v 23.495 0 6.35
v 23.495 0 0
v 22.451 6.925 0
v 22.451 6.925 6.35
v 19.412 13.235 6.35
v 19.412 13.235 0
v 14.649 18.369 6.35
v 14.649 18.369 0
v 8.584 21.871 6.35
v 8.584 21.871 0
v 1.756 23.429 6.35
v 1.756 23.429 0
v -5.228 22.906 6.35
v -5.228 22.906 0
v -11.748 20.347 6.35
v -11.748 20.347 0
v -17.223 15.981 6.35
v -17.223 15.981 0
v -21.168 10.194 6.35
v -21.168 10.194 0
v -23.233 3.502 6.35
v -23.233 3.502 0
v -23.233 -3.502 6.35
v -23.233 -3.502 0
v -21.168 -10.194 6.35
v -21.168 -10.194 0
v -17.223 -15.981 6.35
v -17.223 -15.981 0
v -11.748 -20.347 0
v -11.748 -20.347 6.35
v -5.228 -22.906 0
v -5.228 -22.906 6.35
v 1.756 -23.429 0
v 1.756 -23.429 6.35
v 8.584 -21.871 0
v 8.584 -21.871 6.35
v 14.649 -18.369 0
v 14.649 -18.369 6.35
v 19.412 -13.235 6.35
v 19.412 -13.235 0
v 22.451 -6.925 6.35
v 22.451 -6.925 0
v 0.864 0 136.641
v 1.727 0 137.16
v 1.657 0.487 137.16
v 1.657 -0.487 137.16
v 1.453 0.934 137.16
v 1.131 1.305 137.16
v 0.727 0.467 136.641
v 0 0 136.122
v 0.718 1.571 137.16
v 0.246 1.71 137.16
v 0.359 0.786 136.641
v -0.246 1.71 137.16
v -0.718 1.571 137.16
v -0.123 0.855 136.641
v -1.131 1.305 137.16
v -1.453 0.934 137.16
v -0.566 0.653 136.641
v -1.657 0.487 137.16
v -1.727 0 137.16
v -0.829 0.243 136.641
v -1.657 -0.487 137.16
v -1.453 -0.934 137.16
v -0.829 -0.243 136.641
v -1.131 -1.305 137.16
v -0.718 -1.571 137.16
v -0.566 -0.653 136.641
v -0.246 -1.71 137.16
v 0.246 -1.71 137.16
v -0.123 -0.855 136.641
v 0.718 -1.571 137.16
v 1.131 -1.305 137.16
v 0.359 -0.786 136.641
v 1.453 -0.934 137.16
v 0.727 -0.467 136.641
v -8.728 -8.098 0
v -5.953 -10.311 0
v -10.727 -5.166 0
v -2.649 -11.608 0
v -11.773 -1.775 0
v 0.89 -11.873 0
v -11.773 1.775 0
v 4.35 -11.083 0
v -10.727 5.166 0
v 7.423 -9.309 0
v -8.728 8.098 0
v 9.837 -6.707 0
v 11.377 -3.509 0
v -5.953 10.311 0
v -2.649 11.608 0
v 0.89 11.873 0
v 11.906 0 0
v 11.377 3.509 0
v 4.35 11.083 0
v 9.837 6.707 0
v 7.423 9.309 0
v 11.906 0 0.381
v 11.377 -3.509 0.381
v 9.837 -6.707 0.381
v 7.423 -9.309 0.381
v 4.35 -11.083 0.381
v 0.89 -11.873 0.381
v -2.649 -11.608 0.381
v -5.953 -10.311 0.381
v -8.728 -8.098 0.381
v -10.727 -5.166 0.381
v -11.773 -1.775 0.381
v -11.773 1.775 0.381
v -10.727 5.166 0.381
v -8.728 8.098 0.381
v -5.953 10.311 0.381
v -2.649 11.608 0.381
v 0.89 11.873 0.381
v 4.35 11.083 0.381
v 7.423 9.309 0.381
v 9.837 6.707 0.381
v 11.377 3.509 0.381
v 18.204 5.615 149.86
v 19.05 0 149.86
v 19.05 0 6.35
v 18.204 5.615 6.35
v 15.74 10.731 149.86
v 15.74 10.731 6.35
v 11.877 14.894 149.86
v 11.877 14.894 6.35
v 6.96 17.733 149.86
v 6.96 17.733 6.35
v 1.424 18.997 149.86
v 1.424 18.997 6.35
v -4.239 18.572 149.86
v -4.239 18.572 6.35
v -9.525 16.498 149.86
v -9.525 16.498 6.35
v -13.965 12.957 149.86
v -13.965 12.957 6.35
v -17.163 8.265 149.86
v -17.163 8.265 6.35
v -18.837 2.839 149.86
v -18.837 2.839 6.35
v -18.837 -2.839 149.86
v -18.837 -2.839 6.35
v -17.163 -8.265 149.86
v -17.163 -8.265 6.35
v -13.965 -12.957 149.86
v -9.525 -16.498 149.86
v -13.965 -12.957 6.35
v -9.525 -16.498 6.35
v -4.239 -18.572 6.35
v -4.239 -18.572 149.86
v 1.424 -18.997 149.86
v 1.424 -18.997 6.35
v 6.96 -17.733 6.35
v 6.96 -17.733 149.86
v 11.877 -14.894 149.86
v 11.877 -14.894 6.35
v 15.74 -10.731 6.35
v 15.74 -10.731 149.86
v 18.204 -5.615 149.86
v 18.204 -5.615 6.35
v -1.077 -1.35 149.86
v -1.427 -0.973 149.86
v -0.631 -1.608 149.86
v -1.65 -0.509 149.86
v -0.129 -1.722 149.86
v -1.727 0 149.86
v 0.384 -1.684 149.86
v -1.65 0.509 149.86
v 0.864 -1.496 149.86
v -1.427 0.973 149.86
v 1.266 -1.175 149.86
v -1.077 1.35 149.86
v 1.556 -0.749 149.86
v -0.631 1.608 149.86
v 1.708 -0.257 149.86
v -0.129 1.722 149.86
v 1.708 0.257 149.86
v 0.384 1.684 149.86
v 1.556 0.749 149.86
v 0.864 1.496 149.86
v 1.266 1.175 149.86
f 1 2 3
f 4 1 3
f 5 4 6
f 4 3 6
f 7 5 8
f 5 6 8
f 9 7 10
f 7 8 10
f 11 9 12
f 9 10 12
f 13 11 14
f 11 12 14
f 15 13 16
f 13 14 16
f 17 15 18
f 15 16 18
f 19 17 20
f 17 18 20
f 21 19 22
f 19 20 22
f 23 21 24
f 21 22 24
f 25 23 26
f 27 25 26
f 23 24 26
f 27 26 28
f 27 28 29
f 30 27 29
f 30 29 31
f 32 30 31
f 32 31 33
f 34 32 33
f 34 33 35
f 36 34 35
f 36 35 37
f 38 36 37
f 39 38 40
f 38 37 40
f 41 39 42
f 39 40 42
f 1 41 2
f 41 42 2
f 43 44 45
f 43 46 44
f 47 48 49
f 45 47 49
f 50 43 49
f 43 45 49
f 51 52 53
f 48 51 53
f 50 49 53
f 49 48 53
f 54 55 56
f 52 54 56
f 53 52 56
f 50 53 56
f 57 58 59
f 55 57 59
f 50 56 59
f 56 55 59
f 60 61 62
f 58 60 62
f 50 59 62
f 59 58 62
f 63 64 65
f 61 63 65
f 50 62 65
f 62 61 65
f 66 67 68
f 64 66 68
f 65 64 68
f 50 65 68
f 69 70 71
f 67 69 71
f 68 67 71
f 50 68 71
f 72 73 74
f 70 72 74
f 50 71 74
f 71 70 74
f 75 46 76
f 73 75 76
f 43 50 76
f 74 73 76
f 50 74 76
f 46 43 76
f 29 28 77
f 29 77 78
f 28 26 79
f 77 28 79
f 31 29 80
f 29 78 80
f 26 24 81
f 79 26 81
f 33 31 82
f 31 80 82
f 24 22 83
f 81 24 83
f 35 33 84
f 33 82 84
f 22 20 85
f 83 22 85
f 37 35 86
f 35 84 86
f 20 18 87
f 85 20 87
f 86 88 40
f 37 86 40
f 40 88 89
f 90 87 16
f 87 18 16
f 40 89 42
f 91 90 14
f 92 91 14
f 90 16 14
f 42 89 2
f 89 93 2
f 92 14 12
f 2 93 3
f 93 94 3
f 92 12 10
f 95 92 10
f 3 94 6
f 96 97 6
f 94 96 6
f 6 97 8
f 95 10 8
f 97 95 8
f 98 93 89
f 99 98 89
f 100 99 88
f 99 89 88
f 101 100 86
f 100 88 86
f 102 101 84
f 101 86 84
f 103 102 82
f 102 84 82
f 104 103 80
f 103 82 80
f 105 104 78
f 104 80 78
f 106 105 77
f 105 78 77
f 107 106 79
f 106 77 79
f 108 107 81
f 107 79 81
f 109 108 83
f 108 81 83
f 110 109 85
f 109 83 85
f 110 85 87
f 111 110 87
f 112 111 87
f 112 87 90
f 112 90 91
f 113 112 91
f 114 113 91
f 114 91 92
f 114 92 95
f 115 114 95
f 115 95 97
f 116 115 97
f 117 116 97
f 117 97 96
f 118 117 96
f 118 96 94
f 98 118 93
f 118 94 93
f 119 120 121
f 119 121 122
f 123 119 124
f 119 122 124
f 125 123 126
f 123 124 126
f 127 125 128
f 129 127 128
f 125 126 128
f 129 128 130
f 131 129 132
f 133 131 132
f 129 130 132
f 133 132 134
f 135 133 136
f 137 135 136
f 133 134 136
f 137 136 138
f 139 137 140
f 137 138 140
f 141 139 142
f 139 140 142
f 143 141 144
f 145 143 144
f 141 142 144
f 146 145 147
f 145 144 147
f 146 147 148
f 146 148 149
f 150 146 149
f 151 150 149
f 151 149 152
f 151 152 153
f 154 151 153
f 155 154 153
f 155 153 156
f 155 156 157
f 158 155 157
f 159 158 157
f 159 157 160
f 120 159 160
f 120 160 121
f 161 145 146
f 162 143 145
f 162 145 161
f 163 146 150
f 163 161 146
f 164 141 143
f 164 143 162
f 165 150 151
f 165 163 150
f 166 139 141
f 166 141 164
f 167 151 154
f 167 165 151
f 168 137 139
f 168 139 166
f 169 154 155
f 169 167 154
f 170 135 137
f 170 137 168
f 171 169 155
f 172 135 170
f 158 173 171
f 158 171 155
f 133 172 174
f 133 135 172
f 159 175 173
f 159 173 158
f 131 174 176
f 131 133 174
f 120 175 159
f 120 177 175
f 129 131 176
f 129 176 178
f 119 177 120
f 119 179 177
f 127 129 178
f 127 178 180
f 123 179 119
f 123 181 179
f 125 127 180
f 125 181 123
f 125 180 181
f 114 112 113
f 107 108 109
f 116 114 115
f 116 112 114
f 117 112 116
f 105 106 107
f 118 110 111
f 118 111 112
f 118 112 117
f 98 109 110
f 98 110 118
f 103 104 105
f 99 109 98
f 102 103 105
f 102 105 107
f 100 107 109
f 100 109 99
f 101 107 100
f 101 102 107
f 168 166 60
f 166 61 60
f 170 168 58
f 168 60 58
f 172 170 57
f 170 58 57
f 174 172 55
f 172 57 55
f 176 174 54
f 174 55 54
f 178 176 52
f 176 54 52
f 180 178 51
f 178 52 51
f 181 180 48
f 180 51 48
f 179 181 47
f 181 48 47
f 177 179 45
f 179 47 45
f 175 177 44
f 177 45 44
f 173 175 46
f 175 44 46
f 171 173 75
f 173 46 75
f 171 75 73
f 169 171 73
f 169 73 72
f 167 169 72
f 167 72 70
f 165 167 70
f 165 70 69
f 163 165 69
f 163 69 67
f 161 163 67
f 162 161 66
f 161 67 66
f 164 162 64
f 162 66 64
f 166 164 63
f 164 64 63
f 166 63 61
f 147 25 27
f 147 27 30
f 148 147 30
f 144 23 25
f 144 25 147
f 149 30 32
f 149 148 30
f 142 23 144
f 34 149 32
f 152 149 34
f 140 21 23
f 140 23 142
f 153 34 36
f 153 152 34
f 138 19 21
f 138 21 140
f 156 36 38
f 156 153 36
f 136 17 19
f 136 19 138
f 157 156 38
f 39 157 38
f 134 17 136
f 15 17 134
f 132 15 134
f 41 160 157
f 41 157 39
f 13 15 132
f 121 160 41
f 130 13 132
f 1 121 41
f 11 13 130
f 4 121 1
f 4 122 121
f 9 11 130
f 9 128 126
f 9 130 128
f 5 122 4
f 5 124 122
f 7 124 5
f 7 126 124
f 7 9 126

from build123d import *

# Parameters (mm, degrees)
F0_R     = 23.495
F0_R_2   = 19.05
F1_DEPTH = 6.35
F2_DEPTH = 149.86
F4_D     = 3.4544
F4_DEPTH = 12.7
F4_TIP   = 1.0378064612
F7_R     = 11.90625
F8_DEPTH = 0.381


with BuildPart() as f1:
    # F0 (on Top) → F1 (new body)
    with BuildSketch(Plane.XY):
        Circle(F0_R)
        Circle(F0_R_2, mode=Mode.SUBTRACT)
    extrude(amount=F1_DEPTH)

    # F0 (on Top) → F2 (join)
    with BuildSketch(Plane.XY):
        Circle(F0_R_2)
    extrude(amount=F2_DEPTH)

    # F4
    with Locations(Plane.XY.offset(149.86)):
        with Locations((0, 0)):
            Hole(F4_D / 2, depth=F4_DEPTH)
            with Locations((0, 0, -(F4_DEPTH + F4_TIP / 2))):  # 118° drill point
                Cone(0, F4_D / 2, F4_TIP, mode=Mode.SUBTRACT)


with BuildPart() as f5_1:
    # F5: copy of F1
    add(f1.part)


with BuildPart() as f1_1:
    add(f1.part)

    # F7 (on face) → F8 (cut)
    with BuildSketch(Plane(origin=(0, 0, 0), x_dir=(1, 0, 0), z_dir=(0, 0, -1))):
        Circle(F7_R)
    extrude(amount=-F8_DEPTH, mode=Mode.SUBTRACT)


solid = f1_1.part
